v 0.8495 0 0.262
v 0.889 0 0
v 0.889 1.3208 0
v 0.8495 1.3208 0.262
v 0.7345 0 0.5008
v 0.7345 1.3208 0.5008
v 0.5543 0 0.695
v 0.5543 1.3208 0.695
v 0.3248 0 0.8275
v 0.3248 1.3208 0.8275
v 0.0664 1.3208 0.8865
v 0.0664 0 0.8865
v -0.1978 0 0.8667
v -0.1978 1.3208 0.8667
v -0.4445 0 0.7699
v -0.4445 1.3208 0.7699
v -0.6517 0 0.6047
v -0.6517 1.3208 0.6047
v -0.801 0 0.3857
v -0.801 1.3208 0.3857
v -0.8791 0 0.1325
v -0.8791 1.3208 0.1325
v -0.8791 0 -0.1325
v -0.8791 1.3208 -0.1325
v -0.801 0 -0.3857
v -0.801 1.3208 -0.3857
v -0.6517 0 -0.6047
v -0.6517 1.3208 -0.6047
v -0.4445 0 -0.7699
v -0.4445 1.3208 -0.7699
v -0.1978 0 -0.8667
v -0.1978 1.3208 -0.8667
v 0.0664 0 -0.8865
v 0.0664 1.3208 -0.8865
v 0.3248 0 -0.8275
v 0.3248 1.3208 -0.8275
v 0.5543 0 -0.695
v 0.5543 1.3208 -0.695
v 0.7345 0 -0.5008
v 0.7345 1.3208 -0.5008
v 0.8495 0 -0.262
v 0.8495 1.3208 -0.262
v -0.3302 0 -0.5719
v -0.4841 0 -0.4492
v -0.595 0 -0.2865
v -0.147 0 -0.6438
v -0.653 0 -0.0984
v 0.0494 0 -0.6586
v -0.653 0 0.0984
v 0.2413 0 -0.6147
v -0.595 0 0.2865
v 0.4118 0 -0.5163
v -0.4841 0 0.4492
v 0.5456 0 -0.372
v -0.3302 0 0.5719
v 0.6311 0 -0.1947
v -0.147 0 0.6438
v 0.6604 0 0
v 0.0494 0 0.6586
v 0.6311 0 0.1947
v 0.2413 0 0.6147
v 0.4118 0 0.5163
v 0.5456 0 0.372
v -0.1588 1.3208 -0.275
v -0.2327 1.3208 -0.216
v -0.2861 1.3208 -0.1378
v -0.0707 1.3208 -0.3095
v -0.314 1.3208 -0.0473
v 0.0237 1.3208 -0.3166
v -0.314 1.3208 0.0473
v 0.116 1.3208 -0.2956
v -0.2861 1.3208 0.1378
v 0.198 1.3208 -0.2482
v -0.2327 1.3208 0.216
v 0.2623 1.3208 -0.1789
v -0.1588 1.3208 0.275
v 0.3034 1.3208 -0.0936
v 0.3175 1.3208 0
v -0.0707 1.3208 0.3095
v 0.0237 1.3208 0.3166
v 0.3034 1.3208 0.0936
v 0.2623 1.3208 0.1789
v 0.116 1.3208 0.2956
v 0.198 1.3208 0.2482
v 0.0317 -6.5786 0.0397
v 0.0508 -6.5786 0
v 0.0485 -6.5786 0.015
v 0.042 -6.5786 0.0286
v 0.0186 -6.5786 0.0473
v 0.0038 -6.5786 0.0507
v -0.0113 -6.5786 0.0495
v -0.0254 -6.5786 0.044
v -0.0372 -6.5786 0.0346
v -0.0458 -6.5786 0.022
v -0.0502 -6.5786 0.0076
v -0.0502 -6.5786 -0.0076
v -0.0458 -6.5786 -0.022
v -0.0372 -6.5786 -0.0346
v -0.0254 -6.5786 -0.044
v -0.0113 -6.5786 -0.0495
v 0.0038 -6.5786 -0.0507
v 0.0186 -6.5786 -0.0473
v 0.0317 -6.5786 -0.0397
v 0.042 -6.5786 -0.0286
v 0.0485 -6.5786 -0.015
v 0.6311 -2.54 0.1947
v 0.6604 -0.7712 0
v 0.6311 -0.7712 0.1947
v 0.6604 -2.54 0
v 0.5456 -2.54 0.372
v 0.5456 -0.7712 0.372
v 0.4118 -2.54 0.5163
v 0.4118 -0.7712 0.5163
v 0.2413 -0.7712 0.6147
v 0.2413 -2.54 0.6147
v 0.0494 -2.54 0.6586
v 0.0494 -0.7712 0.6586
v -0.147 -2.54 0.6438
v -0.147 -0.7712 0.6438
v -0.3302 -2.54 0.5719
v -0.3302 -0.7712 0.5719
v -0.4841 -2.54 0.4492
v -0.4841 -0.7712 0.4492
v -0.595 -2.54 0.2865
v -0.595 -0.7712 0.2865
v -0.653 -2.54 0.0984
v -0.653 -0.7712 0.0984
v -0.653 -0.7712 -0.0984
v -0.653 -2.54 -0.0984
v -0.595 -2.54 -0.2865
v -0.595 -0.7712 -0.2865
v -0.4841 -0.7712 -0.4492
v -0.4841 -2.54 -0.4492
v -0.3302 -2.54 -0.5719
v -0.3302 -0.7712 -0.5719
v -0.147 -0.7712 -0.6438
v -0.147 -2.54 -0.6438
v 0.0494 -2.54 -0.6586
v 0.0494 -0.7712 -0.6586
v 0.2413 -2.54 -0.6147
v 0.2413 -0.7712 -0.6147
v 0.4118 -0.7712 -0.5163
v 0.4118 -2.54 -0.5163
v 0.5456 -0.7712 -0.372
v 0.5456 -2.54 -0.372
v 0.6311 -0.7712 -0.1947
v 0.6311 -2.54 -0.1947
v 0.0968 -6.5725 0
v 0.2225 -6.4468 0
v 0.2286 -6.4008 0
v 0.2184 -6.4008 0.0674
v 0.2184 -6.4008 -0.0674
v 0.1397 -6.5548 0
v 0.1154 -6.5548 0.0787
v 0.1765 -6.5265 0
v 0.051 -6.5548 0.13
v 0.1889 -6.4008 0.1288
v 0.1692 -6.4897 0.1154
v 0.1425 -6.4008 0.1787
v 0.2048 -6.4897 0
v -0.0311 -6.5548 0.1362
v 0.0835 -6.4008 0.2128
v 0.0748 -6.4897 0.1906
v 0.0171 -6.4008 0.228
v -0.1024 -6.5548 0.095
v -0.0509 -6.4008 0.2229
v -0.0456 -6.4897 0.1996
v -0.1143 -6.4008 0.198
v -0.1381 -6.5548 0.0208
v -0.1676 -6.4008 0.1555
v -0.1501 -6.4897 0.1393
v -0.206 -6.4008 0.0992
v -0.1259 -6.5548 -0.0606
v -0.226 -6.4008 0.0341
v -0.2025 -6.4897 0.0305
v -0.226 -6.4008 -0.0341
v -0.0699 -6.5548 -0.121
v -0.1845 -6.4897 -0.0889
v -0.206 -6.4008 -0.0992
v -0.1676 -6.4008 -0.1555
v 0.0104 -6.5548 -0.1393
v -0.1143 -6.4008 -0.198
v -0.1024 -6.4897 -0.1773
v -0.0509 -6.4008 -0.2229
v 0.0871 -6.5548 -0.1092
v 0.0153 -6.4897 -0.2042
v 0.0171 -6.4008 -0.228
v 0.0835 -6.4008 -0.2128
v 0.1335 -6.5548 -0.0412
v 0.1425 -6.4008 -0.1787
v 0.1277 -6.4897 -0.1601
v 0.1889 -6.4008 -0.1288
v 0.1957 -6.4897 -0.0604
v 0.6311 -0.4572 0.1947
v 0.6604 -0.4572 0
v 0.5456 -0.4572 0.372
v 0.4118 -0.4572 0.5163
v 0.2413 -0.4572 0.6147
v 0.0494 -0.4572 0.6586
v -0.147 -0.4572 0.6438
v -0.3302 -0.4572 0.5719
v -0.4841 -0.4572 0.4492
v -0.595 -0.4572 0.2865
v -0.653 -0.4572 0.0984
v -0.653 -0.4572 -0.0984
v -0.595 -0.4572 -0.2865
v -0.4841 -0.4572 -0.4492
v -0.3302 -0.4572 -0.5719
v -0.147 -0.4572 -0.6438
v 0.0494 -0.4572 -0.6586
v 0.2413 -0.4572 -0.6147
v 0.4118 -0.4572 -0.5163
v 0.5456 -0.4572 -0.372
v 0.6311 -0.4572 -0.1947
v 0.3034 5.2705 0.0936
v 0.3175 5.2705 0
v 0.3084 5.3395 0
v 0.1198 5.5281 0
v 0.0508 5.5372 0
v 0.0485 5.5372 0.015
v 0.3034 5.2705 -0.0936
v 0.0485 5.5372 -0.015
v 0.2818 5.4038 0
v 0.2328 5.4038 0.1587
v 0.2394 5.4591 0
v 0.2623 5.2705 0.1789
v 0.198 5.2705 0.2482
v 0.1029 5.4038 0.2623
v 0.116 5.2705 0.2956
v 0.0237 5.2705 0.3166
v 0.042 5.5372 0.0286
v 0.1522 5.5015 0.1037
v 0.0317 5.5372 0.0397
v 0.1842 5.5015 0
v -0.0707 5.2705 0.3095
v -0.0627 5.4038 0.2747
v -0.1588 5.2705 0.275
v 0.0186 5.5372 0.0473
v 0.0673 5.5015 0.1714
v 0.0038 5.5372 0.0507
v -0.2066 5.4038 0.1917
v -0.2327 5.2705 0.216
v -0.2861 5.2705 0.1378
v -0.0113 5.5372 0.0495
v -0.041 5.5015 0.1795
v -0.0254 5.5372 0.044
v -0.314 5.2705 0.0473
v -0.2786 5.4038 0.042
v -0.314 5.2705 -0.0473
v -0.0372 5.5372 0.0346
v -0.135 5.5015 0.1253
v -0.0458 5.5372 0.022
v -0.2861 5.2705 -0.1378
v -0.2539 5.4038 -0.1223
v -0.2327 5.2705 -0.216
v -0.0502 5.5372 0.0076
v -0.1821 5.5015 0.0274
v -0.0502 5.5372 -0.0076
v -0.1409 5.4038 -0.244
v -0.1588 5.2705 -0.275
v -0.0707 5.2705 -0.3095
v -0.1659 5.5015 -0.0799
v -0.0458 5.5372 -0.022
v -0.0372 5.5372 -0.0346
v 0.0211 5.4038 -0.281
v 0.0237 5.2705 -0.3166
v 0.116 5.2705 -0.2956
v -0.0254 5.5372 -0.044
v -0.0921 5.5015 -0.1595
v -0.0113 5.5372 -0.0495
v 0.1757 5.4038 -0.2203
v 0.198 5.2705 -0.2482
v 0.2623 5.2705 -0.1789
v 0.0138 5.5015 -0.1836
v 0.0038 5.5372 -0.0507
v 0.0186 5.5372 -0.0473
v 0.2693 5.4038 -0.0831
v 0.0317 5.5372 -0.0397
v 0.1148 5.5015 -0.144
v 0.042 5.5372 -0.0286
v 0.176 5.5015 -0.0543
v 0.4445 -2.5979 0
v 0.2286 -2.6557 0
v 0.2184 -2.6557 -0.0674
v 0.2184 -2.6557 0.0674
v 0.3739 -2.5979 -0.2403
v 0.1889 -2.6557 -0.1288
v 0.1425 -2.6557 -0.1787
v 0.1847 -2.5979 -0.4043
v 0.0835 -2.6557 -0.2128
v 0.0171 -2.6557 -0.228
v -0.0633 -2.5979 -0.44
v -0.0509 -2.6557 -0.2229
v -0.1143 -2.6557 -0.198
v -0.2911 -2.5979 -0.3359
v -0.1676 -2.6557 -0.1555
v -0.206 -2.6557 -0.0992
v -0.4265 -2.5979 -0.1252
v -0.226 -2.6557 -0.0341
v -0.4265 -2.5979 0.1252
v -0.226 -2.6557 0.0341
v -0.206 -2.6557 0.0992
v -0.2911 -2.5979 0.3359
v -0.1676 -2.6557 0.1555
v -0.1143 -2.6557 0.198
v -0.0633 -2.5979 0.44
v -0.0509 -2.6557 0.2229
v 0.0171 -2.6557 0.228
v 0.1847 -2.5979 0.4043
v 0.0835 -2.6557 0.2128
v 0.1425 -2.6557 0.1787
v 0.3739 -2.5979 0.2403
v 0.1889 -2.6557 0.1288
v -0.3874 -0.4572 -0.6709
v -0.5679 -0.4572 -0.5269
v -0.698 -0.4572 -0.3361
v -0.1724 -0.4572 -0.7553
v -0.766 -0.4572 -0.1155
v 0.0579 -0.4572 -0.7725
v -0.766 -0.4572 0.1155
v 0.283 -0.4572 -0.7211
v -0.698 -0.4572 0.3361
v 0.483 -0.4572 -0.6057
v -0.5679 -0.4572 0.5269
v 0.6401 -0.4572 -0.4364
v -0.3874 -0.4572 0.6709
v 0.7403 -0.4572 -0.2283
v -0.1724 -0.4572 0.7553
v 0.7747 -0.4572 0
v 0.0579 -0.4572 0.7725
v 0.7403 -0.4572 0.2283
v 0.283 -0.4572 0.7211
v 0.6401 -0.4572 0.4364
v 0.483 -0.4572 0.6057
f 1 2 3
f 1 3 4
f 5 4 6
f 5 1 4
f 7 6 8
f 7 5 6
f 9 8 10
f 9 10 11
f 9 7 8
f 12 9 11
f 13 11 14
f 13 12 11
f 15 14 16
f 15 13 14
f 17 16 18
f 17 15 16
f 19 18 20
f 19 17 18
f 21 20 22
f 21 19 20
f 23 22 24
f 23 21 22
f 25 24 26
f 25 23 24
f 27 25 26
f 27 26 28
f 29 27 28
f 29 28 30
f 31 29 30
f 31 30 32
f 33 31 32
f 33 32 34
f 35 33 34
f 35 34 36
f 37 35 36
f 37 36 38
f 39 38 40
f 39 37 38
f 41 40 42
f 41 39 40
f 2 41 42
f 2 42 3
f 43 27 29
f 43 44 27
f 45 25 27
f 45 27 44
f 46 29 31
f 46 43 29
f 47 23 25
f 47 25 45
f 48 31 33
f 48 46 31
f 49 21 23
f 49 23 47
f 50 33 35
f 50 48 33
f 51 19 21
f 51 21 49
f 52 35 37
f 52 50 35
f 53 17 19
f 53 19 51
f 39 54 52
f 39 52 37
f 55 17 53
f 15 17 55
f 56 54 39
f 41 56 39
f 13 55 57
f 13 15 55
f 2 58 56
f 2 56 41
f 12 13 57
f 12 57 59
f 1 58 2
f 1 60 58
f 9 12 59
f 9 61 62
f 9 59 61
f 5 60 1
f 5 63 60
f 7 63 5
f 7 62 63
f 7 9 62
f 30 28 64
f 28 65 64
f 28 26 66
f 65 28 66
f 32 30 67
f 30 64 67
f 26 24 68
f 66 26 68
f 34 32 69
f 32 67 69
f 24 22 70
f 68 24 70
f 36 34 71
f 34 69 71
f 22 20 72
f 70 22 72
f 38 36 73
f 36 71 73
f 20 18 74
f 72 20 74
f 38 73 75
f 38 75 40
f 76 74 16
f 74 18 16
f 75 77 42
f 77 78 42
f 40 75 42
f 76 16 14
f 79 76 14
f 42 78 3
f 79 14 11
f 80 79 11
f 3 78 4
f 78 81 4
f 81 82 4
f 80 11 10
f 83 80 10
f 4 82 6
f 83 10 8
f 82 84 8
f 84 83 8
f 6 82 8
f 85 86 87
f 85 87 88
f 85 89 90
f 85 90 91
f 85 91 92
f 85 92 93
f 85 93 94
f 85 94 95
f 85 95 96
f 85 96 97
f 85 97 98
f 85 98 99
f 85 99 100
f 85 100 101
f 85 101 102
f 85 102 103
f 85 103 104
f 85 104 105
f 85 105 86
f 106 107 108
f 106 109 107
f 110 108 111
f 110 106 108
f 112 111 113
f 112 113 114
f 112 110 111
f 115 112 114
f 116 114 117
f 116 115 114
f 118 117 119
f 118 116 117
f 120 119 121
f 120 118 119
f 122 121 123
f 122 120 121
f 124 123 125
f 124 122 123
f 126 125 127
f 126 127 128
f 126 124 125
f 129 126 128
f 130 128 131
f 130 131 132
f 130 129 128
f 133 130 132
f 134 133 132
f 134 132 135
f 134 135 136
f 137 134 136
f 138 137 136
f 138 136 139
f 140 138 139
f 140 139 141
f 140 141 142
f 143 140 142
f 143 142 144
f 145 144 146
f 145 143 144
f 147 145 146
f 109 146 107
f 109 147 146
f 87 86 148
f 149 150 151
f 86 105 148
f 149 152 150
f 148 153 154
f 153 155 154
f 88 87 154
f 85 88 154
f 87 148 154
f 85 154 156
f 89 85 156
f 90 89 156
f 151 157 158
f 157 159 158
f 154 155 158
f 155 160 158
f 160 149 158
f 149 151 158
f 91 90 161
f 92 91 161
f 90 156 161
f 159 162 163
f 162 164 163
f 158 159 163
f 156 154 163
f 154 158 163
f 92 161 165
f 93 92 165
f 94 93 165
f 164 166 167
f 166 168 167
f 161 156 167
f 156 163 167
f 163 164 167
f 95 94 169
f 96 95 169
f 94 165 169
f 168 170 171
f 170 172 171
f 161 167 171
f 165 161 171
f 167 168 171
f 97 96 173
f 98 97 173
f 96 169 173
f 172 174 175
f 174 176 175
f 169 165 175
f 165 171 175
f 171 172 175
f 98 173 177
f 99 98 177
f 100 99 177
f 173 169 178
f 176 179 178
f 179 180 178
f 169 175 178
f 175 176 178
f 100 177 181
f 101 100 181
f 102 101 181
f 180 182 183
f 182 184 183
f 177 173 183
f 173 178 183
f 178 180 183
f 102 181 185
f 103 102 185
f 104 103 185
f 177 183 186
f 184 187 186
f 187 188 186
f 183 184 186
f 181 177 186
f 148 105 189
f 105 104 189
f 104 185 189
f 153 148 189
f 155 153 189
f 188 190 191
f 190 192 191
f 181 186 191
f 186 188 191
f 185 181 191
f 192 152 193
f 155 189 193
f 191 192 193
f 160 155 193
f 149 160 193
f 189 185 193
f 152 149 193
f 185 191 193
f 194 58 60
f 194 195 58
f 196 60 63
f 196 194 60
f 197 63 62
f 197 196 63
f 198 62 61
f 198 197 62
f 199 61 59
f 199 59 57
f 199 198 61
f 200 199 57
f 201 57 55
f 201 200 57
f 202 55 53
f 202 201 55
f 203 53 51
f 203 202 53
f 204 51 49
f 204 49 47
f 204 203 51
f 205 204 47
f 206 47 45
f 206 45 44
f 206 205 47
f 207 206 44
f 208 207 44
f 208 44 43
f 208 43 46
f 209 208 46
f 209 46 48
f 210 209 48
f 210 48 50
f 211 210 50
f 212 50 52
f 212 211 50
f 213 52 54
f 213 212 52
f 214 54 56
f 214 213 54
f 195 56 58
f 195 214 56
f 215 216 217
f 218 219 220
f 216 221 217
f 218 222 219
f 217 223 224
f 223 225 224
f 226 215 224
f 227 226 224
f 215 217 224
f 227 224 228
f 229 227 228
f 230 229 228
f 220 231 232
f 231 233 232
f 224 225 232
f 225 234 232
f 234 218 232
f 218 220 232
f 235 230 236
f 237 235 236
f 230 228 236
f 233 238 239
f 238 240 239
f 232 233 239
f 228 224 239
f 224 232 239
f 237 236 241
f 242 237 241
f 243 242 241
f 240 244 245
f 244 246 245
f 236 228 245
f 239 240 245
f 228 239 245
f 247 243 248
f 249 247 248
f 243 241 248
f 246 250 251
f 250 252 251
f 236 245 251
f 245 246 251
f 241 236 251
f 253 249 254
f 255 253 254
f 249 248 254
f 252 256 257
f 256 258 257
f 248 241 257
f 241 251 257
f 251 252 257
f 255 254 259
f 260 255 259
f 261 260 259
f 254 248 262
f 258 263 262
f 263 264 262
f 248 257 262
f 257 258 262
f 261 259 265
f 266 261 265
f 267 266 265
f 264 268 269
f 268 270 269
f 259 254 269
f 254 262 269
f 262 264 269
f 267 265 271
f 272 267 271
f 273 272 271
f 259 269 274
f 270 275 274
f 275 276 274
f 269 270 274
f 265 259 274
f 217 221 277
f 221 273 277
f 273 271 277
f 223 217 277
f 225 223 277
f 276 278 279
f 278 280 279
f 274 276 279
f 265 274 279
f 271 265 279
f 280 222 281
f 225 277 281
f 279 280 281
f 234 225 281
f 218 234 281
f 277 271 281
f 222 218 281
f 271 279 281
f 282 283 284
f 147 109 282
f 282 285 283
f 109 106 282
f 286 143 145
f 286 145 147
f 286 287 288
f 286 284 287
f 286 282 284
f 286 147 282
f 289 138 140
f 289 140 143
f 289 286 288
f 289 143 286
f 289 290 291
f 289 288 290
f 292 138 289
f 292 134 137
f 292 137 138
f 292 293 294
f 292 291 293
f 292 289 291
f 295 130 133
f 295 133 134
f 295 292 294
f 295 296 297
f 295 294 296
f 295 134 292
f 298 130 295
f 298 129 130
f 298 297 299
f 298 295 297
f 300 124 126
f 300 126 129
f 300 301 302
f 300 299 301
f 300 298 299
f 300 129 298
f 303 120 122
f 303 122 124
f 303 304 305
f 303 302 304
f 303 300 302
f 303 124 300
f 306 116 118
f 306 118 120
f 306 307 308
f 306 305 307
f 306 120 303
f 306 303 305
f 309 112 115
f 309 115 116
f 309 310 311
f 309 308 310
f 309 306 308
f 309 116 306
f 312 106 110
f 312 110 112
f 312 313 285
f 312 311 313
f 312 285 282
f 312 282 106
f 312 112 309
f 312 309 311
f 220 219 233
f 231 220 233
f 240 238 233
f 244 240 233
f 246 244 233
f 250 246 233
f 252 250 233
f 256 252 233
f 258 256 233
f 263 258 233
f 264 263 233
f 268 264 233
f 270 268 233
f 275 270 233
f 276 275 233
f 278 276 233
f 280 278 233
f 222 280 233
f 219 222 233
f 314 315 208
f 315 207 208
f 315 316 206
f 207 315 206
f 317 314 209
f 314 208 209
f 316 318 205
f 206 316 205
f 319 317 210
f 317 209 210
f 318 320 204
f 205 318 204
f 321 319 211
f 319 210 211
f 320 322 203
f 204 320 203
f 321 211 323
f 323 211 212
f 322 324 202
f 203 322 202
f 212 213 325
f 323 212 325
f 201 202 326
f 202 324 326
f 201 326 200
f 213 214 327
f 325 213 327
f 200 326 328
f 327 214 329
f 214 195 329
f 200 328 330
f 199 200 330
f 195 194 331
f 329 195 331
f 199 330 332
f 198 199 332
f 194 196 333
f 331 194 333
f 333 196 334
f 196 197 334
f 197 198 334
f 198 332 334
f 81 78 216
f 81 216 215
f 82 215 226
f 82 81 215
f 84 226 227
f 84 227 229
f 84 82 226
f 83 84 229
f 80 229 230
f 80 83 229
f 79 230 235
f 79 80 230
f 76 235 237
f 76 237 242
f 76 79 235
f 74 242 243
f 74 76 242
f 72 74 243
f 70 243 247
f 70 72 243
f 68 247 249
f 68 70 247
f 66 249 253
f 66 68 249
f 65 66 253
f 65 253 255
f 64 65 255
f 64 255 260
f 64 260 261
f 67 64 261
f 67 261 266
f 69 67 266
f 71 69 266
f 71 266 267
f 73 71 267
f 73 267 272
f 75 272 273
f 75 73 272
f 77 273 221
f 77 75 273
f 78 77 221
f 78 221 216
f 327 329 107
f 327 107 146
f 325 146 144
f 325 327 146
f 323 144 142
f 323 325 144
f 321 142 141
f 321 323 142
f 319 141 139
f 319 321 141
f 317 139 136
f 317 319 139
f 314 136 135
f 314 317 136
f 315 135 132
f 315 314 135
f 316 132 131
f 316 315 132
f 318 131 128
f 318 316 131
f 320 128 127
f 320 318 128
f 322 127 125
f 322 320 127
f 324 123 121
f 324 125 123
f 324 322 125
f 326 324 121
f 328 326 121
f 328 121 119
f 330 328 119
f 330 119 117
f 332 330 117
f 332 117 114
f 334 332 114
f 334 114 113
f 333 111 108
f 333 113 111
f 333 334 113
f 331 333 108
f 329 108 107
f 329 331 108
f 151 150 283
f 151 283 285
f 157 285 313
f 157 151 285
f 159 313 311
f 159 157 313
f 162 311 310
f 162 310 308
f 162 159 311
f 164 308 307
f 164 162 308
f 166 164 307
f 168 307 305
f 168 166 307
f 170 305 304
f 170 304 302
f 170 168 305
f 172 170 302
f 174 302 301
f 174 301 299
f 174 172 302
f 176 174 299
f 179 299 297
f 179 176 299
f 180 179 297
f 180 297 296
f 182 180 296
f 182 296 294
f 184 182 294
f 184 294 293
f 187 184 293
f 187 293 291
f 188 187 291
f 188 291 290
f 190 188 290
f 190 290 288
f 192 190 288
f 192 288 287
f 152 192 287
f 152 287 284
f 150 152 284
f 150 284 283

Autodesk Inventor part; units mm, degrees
sketch "Sketch_1" plane through (0, 0, 0) normal (0, 0, 1) x (1, 0, 0)
  line L0 (0, -2.717) -> (0, 1.3208)
  line L1 (0, 1.3208) -> (0.889, 1.3208)
  line L2 (0.889, 1.3208) -> (0.889, 0)
  line L3 (0.889, 0) -> (0.6604, 0)
  line L4 (0.6604, 0) -> (0.6604, -0.4572)
  line L5 (0.6604, -0.4572) -> (0.7747, -0.4572)
  line L6 (0.7747, -0.4572) -> (0.6604, -0.7712)
  line L7 (0.6604, -0.7712) -> (0.6604, -2.54)
  line L8 (0.6604, -2.54) -> (0, -2.717)
  line L9 (0, -2.717) -> (0, 1.3208)
revolve "Revolution1" add sketch "Sketch_1" angle 360 about axis through (0, -2.717, 0) along (0, -1, 0)
sketch "Sketch_3" plane through (0, 0, 0) normal (0, 0, 1) x (1, 0, 0)
  line L0 (0, 1.3208) -> (0, 5.5372)
  line L1 (0, 5.5372) -> (0.0508, 5.5372)
  arc A0 (0.3175, 5.2705) -> (0.0508, 5.5372) centre (0.0508, 5.2705) ccw
  line L2 (0.3175, 5.2705) -> (0.3175, 1.3208)
  line L3 (0.3175, 1.3208) -> (0, 1.3208)
  line L4 (0, 1.3208) -> (0, 5.5372)
revolve "Revolution2" add sketch "Sketch_3" angle 360 about axis through (0, 1.3208, 0) along (0, -1, 0)
sketch "Sketch_14" plane through (0, 0, 0) normal (0, 0, 1) x (1, 0, 0)
  line L0 (0, -6.5786) -> (0, -1.6256)
  line L1 (0, -1.6256) -> (0.2286, -1.6256)
  line L2 (0.2286, -1.6256) -> (0.2286, -6.4008)
  arc A0 (0.0508, -6.5786) -> (0.2286, -6.4008) centre (0.0508, -6.4008) ccw
  line L3 (0.0508, -6.5786) -> (0, -6.5786)
  line L4 (0, -6.5786) -> (0, -1.6256)
revolve "Revolution3" add sketch "Sketch_14" angle 360 about axis through (0, -6.5786, 0) along (0, -1, 0)
ref_plane "pins_XY" through (0, 0, 0) normal (0, 1, 0) x (1, 0, 0)
ref_plane "pins_YZ" through (0, 0, 0) normal (1, 0, 0) x (0, 0, -1)
ref_plane "pins_ZX" through (0, 0, 0) normal (0, 0, -1) x (0, 1, 0)
properties part number "-101-G-A_pins"
